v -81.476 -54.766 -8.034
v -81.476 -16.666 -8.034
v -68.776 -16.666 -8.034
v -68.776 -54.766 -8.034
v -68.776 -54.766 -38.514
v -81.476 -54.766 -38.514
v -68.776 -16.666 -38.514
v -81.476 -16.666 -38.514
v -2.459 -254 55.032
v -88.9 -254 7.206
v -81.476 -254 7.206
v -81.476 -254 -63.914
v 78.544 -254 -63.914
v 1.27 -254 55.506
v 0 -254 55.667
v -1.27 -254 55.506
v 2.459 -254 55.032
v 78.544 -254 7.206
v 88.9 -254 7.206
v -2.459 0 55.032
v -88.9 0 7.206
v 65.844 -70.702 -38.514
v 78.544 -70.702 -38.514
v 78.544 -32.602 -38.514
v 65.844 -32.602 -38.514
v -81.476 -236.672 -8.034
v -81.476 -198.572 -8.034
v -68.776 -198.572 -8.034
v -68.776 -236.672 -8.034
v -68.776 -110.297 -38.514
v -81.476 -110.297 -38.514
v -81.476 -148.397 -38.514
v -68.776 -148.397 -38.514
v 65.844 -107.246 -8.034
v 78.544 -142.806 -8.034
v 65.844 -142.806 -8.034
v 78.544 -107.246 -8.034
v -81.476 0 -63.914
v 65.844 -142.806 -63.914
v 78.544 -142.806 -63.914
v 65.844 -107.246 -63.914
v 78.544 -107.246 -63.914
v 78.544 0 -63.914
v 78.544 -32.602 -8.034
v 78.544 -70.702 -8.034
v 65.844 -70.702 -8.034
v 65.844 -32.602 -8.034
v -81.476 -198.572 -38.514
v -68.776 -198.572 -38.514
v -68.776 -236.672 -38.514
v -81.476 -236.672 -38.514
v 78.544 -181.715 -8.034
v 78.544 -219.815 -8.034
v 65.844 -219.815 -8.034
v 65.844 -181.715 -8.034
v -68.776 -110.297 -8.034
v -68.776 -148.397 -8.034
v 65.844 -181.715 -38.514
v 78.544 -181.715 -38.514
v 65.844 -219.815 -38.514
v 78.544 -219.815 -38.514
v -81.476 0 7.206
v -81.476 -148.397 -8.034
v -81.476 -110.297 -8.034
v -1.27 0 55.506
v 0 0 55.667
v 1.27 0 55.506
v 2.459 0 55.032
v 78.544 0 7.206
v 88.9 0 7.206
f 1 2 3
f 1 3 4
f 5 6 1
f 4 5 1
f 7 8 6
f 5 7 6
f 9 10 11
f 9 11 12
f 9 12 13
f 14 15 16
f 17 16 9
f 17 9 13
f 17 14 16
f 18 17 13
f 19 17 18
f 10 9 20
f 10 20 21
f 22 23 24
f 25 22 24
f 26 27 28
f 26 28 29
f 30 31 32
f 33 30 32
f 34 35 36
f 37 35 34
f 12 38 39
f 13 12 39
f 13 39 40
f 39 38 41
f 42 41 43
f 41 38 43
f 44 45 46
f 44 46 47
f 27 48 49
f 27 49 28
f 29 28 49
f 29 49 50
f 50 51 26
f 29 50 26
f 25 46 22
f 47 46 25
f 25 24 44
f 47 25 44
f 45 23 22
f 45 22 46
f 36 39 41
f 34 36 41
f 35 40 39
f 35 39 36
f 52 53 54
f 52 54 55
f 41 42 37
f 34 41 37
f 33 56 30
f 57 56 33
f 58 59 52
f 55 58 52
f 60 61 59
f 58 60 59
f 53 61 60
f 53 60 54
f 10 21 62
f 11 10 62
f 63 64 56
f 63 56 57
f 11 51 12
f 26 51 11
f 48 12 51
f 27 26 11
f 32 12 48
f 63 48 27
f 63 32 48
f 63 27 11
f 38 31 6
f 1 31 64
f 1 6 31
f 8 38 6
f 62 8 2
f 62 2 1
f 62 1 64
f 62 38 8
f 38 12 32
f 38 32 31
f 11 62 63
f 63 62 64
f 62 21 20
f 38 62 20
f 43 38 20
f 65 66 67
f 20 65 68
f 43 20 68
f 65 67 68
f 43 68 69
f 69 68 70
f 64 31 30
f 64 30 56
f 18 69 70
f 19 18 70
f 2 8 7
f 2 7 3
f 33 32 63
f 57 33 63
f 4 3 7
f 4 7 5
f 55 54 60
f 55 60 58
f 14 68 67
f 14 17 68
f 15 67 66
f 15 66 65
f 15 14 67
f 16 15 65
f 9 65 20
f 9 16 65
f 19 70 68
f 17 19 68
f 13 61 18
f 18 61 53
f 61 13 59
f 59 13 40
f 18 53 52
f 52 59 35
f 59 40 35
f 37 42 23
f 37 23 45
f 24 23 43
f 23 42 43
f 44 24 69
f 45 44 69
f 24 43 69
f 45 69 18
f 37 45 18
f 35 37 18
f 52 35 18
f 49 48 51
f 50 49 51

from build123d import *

# Parameters (mm, degrees)
F0_W     = 160.02
F0_H     = 71.12
F1_DEPTH = 254
F2_W     = 38.1
F2_H     = 30.48
F2_W_2   = 38.099997
F2_W_3   = 35.56
F2_H_2   = 55.88
F3_DEPTH = 12.7
F5_W     = 38.1
F5_H     = 30.48
F6_DEPTH = 12.7
F7_R     = 5.08


with BuildPart() as f1:
    # F0 (on Front) → F1 (new body)
    with BuildSketch(Plane.XZ):
        with Locations((-1.466153, -28.354255)):
            Rectangle(F0_W, F0_H)
        Polygon((-88.9, 7.205745), (-81.476153, 7.205745), (78.543847, 7.205745), (88.9, 7.205745), (0, 56.392634), align=None)
    extrude(amount=F1_DEPTH)

    # F2 (on face) → F3 (cut)
    with BuildSketch(Plane.YZ.offset(78.543847)):
        with Locations((-200.764716, -23.274255)):
            Rectangle(F2_W, F2_H)
        with Locations((-51.652463, -23.274255)):
            Rectangle(F2_W_2, F2_H)
        with Locations((-125.025785, -35.974255)):
            Rectangle(F2_W_3, F2_H_2)
    extrude(amount=-F3_DEPTH, mode=Mode.SUBTRACT)

    # F5 (on face) → F6 (cut)
    with BuildSketch(Plane(origin=(-81.476153, 0, 0), x_dir=(0, -1, 0), z_dir=(-1, 0, 0))):
        with Locations((35.715754, -23.274255)):
            Rectangle(F5_W, F5_H)
        with Locations((129.347243, -23.274255)):
            Rectangle(F5_W, F5_H)
        with Locations((217.621587, -23.274255)):
            Rectangle(F5_W, F5_H)
    extrude(amount=-F6_DEPTH, mode=Mode.SUBTRACT)

    # F7
    f7_edges = [f1.edges().sort_by_distance(p)[0] for p in [
        (0, -127, 56.392634),
    ]]
    fillet(f7_edges, radius=F7_R)


solid = f1.part
